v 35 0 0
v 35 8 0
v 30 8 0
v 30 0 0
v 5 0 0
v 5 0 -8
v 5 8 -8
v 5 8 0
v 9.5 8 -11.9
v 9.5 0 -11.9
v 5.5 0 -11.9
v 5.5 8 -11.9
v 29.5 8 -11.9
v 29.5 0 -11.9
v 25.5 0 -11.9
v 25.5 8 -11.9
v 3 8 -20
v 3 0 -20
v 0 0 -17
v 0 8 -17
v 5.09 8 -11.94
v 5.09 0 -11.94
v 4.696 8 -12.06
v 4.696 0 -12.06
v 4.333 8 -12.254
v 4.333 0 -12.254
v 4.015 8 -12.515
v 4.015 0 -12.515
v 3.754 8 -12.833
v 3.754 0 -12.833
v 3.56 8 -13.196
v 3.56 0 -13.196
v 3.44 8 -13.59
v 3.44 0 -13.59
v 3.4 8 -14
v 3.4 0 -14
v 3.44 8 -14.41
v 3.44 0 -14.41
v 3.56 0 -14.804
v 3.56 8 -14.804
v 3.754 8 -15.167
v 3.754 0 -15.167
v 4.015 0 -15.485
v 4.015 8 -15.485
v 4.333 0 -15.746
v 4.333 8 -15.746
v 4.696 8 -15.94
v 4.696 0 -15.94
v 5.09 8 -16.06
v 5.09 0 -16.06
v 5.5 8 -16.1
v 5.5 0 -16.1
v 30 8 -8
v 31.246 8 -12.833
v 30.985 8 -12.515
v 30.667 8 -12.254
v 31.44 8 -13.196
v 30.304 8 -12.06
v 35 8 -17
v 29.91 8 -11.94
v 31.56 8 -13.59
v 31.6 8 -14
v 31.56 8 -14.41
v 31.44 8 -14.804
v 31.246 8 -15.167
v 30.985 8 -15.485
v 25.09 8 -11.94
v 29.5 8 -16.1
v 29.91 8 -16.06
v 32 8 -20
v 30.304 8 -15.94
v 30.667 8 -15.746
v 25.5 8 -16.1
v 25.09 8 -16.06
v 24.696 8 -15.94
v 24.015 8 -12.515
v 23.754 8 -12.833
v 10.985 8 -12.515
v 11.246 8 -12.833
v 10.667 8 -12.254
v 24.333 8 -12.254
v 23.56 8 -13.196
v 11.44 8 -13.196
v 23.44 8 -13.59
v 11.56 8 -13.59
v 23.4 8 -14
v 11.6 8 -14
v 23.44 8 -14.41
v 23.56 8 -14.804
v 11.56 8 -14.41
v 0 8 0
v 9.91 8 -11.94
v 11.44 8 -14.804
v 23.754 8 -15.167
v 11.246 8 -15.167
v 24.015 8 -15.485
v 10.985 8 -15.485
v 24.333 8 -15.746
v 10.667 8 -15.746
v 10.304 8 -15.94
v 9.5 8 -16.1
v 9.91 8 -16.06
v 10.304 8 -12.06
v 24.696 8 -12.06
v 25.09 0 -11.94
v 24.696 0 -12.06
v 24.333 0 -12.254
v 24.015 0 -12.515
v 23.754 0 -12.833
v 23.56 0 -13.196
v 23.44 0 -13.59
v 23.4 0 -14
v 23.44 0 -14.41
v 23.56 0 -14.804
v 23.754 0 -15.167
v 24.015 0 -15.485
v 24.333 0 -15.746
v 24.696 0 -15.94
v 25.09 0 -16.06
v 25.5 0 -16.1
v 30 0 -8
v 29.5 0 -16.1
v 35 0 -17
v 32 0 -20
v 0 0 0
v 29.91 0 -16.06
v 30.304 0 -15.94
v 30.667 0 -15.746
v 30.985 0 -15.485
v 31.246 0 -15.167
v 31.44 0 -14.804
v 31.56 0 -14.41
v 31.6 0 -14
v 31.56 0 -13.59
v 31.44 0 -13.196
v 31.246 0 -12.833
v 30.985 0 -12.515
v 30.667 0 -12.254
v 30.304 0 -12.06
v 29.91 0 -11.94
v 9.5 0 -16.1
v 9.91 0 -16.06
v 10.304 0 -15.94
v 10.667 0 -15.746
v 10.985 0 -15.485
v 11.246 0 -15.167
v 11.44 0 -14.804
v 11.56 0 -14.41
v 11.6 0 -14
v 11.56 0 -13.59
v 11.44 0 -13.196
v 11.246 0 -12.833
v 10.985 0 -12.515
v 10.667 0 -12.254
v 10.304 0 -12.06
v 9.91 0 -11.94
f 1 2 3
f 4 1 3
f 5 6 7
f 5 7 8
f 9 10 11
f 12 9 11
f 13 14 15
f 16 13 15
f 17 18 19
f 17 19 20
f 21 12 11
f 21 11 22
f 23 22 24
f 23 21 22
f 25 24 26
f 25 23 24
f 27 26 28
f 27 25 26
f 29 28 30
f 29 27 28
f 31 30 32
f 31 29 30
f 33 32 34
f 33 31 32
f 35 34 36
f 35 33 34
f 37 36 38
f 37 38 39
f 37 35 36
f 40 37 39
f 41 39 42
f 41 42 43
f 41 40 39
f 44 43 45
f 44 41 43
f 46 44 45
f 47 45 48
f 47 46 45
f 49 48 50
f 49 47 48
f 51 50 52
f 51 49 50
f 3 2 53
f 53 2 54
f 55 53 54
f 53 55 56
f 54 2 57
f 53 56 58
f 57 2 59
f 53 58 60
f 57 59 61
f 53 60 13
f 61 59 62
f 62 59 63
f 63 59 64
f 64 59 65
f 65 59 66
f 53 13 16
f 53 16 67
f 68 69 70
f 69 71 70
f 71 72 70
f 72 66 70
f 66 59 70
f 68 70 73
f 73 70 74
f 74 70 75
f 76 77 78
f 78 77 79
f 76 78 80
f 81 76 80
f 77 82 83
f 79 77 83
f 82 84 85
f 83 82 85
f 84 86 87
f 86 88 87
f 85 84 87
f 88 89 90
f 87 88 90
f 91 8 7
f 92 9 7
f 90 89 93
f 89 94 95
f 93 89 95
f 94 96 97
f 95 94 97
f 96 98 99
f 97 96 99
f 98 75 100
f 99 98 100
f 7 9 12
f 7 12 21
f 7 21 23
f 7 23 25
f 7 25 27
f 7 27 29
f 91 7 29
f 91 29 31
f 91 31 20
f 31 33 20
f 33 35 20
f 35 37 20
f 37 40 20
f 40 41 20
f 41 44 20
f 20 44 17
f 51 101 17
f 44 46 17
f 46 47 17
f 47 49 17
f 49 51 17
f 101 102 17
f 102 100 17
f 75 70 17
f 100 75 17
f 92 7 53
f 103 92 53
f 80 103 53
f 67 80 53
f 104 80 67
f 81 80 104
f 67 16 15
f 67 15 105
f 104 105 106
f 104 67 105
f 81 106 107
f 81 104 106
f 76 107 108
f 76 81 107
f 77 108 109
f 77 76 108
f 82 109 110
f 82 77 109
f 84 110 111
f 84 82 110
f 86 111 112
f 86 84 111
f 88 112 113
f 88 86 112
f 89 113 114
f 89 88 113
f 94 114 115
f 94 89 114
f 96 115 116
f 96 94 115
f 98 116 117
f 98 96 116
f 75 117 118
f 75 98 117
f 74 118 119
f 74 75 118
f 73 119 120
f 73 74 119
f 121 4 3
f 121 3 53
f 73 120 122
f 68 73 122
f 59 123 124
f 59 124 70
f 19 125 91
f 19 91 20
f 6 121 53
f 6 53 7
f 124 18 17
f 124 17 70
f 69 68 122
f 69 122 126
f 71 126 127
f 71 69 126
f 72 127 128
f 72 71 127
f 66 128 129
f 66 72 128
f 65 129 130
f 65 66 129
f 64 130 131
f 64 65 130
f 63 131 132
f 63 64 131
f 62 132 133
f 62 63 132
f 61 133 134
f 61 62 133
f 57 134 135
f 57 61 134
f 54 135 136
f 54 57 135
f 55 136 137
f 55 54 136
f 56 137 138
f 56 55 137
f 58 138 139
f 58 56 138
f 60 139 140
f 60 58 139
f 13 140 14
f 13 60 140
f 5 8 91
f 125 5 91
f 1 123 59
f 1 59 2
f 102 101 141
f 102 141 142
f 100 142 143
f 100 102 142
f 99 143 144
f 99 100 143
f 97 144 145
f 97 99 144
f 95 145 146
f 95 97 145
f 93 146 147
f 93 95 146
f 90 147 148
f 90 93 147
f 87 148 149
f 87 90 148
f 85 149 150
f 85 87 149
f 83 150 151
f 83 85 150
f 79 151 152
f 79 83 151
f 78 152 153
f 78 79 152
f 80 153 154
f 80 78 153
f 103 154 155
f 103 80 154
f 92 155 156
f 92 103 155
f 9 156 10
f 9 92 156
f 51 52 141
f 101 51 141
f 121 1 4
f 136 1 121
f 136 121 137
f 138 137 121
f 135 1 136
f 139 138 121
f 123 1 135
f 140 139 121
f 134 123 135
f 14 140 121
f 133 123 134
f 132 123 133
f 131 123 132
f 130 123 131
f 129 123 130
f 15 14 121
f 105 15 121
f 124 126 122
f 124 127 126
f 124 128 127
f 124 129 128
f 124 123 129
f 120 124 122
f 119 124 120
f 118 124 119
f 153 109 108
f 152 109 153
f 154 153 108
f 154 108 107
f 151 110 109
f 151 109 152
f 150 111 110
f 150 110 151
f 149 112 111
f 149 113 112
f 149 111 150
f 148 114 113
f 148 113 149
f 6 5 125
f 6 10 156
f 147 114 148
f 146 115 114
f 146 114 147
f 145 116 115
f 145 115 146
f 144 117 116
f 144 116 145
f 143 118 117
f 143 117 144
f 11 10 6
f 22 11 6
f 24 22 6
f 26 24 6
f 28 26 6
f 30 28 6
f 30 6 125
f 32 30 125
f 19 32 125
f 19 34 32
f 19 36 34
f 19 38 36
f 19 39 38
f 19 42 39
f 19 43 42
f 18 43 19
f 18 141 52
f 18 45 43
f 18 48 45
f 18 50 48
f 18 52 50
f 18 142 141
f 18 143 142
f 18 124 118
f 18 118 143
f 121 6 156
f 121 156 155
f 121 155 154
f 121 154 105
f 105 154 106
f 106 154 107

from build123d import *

# Parameters (mm, degrees)
EXTRUDE_1_DEPTH     = 8
CUT_EXTRUDE_1_DEPTH = 8
CHAMFER_1_SIZE      = 3


with BuildPart() as part:
    # 스케치1 → 보스-돌출1 (new body)
    with BuildSketch(Plane(origin=(0, 0, 0), x_dir=(1, 0, 0), z_dir=(0, 1, 0))):
        Polygon((0, 0), (0, 20), (35, 20), (35, 0), (30, 0), (30, 8), (5, 8), (5, 0), align=None)
    extrude(amount=EXTRUDE_1_DEPTH)

    # 스케치2 → 컷-돌출1 (cut)
    with BuildSketch(Plane(origin=(0, 8, 0), x_dir=(1, 0, 0), z_dir=(0, 1, 0))):
        with BuildLine():
            Line((29.5, 11.9), (25.5, 11.9))
            ThreePointArc((25.5, 11.9), (23.4, 14), (25.5, 16.1))
            Line((25.5, 16.1), (29.5, 16.1))
            ThreePointArc((29.5, 16.1), (31.6, 14), (29.5, 11.9))
        make_face()
        with BuildLine():
            Line((5.5, 16.1), (9.5, 16.1))
            ThreePointArc((9.5, 16.1), (11.6, 14), (9.5, 11.9))
            Line((9.5, 11.9), (5.5, 11.9))
            ThreePointArc((5.5, 11.9), (3.4, 14), (5.5, 16.1))
        make_face()
    extrude(amount=-CUT_EXTRUDE_1_DEPTH, mode=Mode.SUBTRACT)

    # 모따기1
    chamfer_1_edges = [part.edges().sort_by_distance(p)[0] for p in [
        (0, 4, -20),
        (35, 4, -20),
    ]]
    chamfer(chamfer_1_edges, length=CHAMFER_1_SIZE)


solid = part.part
